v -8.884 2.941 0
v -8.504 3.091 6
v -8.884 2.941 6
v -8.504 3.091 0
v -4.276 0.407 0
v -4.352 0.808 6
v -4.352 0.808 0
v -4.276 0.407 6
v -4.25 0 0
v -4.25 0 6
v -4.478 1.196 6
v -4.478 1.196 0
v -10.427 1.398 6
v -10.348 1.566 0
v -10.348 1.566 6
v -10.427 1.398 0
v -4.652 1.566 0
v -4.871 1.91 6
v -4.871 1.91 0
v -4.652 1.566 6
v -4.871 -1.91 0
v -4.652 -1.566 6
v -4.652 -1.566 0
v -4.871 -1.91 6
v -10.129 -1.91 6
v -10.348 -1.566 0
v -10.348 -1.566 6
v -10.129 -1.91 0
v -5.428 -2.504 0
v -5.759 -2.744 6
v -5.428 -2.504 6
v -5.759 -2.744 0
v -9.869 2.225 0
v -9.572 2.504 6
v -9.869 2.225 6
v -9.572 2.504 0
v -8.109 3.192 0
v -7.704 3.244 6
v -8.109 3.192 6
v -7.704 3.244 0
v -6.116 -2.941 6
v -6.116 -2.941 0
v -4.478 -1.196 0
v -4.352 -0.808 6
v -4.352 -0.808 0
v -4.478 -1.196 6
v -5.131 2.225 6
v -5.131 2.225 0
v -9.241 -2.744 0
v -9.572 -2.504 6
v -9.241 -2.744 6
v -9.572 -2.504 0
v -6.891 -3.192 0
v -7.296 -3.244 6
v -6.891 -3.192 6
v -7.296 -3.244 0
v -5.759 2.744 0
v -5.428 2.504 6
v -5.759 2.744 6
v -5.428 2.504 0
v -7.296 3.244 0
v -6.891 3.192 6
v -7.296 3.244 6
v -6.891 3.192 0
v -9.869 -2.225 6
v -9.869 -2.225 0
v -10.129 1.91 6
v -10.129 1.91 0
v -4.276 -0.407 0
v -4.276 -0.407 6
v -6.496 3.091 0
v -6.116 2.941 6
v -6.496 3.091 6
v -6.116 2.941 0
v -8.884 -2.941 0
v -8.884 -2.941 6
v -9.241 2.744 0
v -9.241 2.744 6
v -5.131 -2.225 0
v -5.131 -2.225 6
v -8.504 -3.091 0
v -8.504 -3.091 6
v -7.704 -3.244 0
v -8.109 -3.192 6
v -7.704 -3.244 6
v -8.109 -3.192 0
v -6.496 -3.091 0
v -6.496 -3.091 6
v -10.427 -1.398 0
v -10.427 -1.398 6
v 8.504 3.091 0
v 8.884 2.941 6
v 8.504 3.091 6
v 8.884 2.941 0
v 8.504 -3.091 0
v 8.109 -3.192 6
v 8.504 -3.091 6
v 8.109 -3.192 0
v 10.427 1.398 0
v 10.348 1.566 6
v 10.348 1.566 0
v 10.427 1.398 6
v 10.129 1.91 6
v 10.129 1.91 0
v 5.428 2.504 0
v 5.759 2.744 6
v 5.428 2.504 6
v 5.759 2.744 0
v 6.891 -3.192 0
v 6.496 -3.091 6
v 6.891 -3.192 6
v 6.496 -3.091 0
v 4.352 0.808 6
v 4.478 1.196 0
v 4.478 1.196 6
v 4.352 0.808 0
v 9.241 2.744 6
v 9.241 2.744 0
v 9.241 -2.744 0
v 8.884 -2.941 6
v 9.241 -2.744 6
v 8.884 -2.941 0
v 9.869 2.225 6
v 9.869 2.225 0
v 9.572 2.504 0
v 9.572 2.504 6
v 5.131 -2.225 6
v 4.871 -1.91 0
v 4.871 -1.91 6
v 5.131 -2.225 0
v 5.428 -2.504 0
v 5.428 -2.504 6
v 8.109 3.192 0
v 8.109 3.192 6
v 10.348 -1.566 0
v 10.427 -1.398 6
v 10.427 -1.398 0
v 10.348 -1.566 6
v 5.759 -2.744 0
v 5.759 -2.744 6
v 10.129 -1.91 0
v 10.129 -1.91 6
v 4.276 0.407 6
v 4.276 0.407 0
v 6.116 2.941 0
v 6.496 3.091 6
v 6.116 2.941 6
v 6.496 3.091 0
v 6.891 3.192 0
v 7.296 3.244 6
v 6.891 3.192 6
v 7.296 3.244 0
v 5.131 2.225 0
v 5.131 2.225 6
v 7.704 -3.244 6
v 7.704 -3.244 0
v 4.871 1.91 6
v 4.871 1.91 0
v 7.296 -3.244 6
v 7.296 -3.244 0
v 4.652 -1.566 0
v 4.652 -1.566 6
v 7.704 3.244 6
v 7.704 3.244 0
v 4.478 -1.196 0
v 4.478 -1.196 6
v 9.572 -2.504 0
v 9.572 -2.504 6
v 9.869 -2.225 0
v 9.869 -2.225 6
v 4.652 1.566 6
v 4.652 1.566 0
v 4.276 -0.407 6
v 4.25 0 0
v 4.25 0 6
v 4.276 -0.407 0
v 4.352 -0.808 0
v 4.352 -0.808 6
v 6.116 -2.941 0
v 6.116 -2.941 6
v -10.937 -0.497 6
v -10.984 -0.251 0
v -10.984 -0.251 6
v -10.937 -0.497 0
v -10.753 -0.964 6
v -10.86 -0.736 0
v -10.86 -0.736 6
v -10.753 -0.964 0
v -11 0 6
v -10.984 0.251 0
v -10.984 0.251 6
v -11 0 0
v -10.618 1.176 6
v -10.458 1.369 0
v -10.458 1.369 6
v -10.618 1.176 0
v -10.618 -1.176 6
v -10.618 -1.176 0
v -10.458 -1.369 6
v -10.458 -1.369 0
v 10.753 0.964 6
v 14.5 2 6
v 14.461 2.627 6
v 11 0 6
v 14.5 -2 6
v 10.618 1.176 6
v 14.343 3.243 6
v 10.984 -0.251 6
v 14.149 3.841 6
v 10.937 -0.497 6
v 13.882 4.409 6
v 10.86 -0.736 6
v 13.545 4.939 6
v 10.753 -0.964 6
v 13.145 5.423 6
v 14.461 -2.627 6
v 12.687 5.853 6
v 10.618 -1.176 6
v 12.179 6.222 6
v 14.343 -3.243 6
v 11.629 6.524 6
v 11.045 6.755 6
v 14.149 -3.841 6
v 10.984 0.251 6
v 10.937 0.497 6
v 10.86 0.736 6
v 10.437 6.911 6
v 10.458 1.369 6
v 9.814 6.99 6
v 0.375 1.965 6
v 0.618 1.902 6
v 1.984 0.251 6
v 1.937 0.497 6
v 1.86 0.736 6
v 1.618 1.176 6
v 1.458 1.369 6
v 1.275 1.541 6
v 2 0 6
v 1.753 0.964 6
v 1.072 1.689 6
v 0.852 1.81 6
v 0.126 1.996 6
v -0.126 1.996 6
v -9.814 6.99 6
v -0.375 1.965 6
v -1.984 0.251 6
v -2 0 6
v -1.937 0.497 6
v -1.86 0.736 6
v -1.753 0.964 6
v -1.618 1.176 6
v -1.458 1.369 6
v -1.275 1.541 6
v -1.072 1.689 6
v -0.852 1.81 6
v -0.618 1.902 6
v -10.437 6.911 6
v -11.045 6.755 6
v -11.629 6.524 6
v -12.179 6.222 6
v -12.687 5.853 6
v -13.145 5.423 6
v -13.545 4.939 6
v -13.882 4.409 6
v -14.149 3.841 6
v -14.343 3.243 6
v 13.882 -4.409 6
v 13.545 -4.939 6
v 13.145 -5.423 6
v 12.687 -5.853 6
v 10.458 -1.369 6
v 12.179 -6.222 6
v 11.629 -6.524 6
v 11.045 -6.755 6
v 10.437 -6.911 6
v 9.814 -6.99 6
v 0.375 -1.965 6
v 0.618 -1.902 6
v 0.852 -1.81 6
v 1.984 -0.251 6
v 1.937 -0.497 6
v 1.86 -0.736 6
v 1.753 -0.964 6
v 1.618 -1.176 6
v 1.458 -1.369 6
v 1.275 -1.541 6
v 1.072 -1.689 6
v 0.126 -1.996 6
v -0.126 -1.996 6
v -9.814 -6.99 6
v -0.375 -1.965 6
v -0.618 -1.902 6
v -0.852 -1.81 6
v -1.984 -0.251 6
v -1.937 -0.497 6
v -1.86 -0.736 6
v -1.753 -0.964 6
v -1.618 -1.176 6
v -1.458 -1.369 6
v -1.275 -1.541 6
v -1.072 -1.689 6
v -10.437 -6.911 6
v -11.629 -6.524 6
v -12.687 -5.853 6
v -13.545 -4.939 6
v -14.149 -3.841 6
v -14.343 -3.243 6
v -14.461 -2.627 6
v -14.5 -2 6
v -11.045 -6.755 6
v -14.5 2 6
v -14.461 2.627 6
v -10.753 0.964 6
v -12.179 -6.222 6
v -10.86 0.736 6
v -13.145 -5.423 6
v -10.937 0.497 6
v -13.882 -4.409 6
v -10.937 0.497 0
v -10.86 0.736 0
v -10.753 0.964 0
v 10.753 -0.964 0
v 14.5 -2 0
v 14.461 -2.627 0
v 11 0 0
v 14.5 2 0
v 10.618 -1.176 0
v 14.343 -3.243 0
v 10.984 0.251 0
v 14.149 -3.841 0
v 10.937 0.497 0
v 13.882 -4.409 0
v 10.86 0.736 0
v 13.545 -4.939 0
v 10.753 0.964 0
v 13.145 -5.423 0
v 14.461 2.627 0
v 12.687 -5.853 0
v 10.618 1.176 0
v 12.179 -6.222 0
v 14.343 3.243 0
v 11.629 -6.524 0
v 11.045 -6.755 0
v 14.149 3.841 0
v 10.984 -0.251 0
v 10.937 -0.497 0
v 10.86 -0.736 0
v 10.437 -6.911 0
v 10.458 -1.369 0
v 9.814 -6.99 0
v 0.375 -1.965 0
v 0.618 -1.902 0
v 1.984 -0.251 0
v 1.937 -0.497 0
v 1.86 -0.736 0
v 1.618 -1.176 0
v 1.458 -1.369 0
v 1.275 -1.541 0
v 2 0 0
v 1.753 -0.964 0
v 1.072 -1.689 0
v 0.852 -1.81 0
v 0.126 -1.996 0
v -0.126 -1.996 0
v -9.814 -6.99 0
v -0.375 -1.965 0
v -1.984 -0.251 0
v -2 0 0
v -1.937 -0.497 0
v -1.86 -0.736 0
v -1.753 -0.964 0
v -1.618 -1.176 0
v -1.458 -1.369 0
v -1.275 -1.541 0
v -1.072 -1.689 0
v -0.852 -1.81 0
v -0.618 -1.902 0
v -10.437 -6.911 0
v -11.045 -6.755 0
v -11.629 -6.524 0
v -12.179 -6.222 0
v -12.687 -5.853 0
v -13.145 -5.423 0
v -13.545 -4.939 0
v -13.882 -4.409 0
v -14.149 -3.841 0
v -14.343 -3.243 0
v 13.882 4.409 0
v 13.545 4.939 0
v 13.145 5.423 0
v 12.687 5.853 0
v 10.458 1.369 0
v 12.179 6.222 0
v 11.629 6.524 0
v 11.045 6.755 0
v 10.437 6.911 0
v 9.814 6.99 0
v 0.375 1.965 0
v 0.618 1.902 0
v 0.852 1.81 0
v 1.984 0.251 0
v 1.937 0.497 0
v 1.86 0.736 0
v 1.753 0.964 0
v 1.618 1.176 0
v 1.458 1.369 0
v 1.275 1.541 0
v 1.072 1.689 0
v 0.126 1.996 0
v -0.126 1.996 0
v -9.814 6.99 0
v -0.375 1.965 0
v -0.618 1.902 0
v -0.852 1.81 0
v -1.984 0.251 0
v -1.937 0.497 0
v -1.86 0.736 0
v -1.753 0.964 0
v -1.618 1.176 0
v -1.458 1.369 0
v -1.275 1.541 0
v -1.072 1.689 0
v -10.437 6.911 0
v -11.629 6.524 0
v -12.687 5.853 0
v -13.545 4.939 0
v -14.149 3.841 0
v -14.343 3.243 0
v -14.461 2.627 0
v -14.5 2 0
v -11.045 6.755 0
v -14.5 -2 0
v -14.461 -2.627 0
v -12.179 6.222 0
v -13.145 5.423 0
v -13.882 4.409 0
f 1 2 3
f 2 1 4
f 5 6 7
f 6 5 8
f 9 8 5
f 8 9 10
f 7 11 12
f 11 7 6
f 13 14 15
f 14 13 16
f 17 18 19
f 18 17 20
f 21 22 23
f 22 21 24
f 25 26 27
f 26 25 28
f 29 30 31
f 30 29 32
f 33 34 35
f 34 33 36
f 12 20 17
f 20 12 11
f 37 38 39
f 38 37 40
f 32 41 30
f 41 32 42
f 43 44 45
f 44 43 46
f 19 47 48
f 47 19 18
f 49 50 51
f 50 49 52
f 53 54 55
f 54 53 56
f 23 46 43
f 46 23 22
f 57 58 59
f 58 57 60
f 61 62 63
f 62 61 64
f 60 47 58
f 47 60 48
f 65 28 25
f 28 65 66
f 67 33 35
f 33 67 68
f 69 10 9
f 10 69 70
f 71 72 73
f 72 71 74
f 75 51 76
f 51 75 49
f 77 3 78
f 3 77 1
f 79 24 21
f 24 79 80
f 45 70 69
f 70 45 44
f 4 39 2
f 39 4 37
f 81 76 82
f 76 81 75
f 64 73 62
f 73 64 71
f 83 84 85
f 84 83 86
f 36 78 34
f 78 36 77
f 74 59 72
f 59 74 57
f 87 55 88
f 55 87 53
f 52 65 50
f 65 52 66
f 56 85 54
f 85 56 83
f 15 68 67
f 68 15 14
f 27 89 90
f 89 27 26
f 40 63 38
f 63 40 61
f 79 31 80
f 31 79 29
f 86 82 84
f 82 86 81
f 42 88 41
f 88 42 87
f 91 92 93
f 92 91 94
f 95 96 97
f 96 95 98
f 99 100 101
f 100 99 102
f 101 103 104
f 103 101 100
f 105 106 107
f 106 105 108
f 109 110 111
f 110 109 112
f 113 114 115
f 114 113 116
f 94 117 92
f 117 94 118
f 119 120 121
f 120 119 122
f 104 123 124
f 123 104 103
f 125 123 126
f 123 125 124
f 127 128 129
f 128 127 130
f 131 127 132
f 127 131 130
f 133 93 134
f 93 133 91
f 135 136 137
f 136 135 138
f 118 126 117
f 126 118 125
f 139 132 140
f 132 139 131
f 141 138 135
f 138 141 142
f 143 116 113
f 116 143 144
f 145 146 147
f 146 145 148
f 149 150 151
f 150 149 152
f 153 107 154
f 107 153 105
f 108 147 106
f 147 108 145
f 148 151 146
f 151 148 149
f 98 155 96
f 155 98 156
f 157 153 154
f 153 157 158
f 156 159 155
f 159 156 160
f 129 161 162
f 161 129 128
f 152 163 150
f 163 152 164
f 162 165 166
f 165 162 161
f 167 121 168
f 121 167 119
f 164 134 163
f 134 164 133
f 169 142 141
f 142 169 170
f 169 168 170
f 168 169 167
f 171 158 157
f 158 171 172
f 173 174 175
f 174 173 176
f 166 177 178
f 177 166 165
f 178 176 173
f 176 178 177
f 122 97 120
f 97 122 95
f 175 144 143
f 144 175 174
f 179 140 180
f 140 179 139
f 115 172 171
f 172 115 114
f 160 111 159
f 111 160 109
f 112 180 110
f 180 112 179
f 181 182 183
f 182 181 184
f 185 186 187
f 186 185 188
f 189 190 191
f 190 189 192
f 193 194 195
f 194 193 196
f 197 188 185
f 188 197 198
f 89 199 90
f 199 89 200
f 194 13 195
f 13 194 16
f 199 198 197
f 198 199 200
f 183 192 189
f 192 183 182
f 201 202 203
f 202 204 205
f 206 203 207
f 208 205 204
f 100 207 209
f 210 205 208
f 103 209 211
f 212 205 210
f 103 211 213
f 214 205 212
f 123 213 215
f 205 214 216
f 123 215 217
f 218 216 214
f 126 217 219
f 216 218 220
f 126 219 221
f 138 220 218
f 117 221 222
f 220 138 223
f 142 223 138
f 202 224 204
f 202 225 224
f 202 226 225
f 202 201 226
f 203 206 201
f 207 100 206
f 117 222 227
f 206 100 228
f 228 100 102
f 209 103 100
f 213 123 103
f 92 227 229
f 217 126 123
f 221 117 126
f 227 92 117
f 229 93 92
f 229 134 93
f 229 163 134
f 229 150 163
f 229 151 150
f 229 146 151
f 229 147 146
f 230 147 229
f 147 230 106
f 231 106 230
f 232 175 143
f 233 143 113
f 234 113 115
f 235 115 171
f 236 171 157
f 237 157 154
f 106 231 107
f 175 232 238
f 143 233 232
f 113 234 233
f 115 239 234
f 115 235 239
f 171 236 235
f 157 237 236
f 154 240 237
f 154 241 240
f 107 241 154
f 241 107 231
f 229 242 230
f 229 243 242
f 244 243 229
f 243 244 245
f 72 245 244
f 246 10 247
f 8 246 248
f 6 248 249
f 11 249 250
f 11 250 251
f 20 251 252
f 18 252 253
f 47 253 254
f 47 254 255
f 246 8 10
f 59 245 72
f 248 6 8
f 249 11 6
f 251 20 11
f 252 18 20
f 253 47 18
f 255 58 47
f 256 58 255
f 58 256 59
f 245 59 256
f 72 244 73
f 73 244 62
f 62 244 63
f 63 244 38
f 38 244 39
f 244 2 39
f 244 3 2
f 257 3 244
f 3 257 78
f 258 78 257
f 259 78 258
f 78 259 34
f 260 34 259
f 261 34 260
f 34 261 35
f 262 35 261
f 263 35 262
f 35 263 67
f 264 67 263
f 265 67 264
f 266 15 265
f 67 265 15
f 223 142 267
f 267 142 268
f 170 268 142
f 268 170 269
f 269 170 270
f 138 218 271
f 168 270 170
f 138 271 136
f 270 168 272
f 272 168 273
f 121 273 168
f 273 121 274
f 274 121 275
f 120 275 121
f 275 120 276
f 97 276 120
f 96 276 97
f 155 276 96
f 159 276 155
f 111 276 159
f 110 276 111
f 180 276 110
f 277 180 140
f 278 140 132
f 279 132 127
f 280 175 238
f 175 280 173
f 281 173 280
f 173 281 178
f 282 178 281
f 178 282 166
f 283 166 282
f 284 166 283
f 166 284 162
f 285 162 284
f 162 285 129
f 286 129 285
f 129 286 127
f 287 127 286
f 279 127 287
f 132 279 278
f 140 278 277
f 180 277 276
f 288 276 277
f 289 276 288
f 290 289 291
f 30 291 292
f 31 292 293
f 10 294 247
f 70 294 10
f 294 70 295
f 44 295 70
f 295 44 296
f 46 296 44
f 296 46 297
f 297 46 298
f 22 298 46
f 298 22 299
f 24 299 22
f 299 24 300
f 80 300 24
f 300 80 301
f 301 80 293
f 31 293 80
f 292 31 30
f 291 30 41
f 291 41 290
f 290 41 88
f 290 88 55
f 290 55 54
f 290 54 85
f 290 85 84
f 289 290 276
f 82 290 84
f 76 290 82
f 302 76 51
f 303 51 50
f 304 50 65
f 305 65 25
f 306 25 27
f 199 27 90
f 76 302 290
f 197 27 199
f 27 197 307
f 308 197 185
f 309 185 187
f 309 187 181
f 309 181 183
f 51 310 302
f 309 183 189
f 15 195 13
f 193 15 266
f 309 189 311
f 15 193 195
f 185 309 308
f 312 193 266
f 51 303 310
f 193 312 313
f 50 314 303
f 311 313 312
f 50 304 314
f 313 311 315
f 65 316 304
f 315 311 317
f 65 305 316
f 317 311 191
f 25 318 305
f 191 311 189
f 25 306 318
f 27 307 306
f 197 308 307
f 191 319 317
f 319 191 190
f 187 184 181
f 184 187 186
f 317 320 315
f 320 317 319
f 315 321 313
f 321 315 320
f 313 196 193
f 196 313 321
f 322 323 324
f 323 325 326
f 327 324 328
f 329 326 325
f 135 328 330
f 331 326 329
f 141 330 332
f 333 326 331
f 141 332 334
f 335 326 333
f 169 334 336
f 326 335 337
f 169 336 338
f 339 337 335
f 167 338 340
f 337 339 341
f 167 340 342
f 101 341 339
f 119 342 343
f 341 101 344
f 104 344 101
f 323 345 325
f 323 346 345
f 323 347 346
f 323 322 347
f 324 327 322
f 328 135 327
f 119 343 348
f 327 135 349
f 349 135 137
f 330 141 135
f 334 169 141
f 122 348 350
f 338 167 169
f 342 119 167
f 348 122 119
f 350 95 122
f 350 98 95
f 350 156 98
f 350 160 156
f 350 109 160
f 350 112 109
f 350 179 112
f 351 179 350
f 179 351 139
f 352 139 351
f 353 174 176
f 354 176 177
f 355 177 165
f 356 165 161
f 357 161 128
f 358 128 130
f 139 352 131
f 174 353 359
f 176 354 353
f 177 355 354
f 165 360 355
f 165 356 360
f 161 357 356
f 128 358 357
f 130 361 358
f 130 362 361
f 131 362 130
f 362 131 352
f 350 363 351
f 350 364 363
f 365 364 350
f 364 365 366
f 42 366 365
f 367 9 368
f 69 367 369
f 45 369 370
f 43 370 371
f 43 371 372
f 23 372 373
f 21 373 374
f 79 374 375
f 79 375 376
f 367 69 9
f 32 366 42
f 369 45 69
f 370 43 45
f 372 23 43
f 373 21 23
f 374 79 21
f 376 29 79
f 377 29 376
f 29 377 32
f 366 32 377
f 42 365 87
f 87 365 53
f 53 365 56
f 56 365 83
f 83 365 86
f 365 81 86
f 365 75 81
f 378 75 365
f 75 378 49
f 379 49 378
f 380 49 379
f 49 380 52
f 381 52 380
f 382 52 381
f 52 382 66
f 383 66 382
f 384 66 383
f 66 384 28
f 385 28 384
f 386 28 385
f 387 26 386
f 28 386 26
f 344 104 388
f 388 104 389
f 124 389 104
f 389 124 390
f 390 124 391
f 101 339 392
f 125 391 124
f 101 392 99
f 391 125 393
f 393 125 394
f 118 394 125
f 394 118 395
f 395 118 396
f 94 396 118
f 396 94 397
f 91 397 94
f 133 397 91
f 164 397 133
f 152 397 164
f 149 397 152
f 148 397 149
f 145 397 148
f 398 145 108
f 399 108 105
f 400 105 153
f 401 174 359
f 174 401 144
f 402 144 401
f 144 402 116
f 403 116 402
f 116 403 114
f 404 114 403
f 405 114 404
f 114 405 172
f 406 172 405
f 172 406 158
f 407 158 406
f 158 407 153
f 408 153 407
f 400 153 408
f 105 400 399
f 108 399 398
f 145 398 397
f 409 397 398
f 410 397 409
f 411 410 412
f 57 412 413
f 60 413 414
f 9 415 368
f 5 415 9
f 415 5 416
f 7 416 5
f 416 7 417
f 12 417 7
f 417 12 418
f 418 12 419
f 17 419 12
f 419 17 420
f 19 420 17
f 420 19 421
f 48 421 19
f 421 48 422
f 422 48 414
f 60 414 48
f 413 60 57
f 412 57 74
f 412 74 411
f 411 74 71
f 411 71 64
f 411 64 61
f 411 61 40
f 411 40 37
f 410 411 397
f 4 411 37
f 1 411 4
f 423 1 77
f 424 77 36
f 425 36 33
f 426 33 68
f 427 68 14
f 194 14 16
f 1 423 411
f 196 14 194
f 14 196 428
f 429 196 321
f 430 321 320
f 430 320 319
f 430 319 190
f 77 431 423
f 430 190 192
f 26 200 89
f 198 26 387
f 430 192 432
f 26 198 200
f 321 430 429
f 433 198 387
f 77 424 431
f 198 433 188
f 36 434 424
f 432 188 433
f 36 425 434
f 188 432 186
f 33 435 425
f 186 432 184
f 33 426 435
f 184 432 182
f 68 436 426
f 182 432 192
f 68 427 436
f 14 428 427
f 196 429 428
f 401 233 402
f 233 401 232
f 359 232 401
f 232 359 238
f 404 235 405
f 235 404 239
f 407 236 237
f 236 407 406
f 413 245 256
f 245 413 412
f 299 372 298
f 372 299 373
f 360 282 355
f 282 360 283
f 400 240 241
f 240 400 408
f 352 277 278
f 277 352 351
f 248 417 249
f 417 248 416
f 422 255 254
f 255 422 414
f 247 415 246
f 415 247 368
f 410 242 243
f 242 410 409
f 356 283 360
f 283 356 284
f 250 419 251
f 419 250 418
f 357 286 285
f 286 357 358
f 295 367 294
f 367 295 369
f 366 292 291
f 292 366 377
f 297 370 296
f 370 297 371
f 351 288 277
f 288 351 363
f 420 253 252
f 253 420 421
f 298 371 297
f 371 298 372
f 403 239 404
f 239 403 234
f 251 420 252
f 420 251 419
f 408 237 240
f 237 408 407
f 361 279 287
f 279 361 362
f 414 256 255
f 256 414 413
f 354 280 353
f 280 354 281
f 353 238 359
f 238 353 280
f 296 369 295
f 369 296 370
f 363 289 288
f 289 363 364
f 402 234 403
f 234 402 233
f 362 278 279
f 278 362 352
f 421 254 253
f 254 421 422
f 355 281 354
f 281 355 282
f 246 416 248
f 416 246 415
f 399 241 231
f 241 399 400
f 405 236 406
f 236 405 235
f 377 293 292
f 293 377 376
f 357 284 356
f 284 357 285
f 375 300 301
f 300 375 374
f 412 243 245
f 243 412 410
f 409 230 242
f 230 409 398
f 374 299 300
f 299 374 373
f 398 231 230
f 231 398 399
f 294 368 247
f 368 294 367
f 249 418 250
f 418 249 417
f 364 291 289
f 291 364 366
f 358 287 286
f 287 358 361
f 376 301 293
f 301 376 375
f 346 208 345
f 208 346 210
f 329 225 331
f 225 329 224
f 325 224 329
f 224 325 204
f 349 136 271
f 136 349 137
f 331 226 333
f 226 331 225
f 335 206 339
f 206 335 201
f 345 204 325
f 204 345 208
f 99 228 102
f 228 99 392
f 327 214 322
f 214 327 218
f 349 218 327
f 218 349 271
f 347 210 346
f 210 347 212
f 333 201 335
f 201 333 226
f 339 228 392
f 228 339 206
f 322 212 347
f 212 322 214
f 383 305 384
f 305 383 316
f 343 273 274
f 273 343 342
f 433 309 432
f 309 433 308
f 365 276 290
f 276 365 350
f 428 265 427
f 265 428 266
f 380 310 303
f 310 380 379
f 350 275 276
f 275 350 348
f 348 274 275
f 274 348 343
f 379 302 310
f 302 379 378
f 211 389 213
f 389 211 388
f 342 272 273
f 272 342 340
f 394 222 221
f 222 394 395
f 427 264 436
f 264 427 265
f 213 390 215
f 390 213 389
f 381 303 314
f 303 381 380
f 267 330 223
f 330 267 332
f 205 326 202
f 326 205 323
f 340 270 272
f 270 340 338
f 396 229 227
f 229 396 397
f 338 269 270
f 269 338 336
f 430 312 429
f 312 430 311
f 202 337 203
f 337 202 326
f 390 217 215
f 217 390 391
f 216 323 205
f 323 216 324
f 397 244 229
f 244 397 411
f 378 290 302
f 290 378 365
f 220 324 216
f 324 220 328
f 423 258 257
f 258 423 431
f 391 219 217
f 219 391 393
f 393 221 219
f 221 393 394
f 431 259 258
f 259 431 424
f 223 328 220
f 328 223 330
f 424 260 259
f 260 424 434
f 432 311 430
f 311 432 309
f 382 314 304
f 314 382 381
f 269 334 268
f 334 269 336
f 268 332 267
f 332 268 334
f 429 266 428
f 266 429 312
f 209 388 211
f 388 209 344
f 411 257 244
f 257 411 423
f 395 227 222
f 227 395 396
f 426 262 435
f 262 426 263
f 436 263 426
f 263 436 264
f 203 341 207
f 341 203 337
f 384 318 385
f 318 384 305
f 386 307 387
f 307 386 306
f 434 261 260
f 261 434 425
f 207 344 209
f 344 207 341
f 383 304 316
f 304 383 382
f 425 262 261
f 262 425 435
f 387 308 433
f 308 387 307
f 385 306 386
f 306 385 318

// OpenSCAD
$fn = 50;

difference() {
	union() {
		hull() {
			translate(v = [-9.5, 2.0, 0]) {
				cylinder(h = 6, r = 5);
			}
			translate(v = [9.5, 2.0, 0]) {
				cylinder(h = 6, r = 5);
			}
			translate(v = [-9.5, -2.0, 0]) {
				cylinder(h = 6, r = 5);
			}
			translate(v = [9.5, -2.0, 0]) {
				cylinder(h = 6, r = 5);
			}
		}
	}
	union() {
		translate(v = [-7.5, 0.0, -100.0]) {
			cylinder(h = 200, r = 3.25);
		}
		translate(v = [7.5, 0.0, -100.0]) {
			cylinder(h = 200, r = 3.25);
		}
		translate(v = [-7.5, 0.0, -100.0]) {
			cylinder(h = 200, r = 1.8);
		}
		translate(v = [7.5, 0.0, -100.0]) {
			cylinder(h = 200, r = 1.8);
		}
		translate(v = [-9.0, 0, 0.0]) {
			cylinder(h = 6, r = 2.0);
		}
		cylinder(h = 6, r = 2.0);
		translate(v = [9.0, 0, 0.0]) {
			cylinder(h = 6, r = 2.0);
		}
	}
}
